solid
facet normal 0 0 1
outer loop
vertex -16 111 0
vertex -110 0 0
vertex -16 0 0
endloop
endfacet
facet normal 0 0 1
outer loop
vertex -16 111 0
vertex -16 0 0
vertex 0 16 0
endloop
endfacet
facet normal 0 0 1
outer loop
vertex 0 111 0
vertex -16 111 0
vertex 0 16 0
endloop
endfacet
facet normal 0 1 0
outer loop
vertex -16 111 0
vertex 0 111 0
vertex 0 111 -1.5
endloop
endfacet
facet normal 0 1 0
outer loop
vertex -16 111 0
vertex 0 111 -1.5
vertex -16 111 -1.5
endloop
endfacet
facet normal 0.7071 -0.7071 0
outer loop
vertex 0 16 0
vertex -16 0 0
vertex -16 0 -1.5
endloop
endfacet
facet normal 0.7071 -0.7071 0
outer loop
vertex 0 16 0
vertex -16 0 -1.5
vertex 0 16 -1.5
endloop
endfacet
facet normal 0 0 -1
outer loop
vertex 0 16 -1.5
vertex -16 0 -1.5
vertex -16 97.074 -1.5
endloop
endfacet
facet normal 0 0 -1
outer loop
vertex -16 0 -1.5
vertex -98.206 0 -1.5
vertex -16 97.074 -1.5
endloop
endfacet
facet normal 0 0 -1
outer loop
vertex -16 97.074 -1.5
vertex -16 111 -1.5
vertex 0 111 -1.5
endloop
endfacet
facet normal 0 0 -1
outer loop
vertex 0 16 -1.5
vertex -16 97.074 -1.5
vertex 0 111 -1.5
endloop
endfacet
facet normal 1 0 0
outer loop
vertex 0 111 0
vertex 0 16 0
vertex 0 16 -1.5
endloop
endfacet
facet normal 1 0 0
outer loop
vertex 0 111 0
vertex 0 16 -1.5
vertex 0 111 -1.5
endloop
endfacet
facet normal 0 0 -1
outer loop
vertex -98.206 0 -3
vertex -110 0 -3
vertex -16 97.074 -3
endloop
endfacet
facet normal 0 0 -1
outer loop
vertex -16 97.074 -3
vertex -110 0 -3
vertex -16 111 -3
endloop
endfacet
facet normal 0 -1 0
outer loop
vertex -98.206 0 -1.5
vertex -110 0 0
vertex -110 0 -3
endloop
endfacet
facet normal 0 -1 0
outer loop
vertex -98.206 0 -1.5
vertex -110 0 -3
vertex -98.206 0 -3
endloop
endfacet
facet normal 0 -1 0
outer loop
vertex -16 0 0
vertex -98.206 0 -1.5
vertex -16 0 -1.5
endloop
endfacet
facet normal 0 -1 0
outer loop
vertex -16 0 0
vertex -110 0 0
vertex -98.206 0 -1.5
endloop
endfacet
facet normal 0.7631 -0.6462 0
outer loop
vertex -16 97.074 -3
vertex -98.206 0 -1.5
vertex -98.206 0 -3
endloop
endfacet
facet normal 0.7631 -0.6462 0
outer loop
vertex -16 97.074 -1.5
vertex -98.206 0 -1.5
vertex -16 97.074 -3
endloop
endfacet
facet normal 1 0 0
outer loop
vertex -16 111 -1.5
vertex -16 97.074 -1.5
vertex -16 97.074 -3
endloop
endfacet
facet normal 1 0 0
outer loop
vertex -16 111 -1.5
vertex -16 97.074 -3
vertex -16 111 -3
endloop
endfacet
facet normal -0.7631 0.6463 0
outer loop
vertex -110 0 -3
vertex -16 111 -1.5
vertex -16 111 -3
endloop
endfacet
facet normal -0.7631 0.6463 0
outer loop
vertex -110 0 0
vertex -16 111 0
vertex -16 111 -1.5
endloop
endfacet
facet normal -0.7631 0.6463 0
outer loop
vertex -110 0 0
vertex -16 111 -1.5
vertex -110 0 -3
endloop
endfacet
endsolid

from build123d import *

# Parameters (mm, degrees)
EXTRUDE_1_DEPTH = 1.5
EXTRUDE_2_DEPTH = 3


with BuildPart() as part:
    # 草圖1 → 擠出1 (new body)
    with BuildSketch(Plane.XY):
        Polygon((-16, 0), (0, 16), (0, 111), (-16, 111), (-16, 97.073509127), (-98.206395117, 0), align=None)
    extrude(amount=EXTRUDE_1_DEPTH)

    # 草圖2 → 擠出2 (add)
    with BuildSketch(Plane.XY):
        Polygon((-110, 0), (-98.206395117, 0), (-16, 97.073509127), (-16, 111), align=None)
    extrude(amount=EXTRUDE_2_DEPTH)


with BuildPart() as body_2:
    # 鏡射1: mirrored copy
    add(part.part.mirror(Plane(origin=(-44.219505569, 22.2, 0), x_dir=(1, 0, 0), z_dir=(0, 0, 1))))


solid = body_2.part
